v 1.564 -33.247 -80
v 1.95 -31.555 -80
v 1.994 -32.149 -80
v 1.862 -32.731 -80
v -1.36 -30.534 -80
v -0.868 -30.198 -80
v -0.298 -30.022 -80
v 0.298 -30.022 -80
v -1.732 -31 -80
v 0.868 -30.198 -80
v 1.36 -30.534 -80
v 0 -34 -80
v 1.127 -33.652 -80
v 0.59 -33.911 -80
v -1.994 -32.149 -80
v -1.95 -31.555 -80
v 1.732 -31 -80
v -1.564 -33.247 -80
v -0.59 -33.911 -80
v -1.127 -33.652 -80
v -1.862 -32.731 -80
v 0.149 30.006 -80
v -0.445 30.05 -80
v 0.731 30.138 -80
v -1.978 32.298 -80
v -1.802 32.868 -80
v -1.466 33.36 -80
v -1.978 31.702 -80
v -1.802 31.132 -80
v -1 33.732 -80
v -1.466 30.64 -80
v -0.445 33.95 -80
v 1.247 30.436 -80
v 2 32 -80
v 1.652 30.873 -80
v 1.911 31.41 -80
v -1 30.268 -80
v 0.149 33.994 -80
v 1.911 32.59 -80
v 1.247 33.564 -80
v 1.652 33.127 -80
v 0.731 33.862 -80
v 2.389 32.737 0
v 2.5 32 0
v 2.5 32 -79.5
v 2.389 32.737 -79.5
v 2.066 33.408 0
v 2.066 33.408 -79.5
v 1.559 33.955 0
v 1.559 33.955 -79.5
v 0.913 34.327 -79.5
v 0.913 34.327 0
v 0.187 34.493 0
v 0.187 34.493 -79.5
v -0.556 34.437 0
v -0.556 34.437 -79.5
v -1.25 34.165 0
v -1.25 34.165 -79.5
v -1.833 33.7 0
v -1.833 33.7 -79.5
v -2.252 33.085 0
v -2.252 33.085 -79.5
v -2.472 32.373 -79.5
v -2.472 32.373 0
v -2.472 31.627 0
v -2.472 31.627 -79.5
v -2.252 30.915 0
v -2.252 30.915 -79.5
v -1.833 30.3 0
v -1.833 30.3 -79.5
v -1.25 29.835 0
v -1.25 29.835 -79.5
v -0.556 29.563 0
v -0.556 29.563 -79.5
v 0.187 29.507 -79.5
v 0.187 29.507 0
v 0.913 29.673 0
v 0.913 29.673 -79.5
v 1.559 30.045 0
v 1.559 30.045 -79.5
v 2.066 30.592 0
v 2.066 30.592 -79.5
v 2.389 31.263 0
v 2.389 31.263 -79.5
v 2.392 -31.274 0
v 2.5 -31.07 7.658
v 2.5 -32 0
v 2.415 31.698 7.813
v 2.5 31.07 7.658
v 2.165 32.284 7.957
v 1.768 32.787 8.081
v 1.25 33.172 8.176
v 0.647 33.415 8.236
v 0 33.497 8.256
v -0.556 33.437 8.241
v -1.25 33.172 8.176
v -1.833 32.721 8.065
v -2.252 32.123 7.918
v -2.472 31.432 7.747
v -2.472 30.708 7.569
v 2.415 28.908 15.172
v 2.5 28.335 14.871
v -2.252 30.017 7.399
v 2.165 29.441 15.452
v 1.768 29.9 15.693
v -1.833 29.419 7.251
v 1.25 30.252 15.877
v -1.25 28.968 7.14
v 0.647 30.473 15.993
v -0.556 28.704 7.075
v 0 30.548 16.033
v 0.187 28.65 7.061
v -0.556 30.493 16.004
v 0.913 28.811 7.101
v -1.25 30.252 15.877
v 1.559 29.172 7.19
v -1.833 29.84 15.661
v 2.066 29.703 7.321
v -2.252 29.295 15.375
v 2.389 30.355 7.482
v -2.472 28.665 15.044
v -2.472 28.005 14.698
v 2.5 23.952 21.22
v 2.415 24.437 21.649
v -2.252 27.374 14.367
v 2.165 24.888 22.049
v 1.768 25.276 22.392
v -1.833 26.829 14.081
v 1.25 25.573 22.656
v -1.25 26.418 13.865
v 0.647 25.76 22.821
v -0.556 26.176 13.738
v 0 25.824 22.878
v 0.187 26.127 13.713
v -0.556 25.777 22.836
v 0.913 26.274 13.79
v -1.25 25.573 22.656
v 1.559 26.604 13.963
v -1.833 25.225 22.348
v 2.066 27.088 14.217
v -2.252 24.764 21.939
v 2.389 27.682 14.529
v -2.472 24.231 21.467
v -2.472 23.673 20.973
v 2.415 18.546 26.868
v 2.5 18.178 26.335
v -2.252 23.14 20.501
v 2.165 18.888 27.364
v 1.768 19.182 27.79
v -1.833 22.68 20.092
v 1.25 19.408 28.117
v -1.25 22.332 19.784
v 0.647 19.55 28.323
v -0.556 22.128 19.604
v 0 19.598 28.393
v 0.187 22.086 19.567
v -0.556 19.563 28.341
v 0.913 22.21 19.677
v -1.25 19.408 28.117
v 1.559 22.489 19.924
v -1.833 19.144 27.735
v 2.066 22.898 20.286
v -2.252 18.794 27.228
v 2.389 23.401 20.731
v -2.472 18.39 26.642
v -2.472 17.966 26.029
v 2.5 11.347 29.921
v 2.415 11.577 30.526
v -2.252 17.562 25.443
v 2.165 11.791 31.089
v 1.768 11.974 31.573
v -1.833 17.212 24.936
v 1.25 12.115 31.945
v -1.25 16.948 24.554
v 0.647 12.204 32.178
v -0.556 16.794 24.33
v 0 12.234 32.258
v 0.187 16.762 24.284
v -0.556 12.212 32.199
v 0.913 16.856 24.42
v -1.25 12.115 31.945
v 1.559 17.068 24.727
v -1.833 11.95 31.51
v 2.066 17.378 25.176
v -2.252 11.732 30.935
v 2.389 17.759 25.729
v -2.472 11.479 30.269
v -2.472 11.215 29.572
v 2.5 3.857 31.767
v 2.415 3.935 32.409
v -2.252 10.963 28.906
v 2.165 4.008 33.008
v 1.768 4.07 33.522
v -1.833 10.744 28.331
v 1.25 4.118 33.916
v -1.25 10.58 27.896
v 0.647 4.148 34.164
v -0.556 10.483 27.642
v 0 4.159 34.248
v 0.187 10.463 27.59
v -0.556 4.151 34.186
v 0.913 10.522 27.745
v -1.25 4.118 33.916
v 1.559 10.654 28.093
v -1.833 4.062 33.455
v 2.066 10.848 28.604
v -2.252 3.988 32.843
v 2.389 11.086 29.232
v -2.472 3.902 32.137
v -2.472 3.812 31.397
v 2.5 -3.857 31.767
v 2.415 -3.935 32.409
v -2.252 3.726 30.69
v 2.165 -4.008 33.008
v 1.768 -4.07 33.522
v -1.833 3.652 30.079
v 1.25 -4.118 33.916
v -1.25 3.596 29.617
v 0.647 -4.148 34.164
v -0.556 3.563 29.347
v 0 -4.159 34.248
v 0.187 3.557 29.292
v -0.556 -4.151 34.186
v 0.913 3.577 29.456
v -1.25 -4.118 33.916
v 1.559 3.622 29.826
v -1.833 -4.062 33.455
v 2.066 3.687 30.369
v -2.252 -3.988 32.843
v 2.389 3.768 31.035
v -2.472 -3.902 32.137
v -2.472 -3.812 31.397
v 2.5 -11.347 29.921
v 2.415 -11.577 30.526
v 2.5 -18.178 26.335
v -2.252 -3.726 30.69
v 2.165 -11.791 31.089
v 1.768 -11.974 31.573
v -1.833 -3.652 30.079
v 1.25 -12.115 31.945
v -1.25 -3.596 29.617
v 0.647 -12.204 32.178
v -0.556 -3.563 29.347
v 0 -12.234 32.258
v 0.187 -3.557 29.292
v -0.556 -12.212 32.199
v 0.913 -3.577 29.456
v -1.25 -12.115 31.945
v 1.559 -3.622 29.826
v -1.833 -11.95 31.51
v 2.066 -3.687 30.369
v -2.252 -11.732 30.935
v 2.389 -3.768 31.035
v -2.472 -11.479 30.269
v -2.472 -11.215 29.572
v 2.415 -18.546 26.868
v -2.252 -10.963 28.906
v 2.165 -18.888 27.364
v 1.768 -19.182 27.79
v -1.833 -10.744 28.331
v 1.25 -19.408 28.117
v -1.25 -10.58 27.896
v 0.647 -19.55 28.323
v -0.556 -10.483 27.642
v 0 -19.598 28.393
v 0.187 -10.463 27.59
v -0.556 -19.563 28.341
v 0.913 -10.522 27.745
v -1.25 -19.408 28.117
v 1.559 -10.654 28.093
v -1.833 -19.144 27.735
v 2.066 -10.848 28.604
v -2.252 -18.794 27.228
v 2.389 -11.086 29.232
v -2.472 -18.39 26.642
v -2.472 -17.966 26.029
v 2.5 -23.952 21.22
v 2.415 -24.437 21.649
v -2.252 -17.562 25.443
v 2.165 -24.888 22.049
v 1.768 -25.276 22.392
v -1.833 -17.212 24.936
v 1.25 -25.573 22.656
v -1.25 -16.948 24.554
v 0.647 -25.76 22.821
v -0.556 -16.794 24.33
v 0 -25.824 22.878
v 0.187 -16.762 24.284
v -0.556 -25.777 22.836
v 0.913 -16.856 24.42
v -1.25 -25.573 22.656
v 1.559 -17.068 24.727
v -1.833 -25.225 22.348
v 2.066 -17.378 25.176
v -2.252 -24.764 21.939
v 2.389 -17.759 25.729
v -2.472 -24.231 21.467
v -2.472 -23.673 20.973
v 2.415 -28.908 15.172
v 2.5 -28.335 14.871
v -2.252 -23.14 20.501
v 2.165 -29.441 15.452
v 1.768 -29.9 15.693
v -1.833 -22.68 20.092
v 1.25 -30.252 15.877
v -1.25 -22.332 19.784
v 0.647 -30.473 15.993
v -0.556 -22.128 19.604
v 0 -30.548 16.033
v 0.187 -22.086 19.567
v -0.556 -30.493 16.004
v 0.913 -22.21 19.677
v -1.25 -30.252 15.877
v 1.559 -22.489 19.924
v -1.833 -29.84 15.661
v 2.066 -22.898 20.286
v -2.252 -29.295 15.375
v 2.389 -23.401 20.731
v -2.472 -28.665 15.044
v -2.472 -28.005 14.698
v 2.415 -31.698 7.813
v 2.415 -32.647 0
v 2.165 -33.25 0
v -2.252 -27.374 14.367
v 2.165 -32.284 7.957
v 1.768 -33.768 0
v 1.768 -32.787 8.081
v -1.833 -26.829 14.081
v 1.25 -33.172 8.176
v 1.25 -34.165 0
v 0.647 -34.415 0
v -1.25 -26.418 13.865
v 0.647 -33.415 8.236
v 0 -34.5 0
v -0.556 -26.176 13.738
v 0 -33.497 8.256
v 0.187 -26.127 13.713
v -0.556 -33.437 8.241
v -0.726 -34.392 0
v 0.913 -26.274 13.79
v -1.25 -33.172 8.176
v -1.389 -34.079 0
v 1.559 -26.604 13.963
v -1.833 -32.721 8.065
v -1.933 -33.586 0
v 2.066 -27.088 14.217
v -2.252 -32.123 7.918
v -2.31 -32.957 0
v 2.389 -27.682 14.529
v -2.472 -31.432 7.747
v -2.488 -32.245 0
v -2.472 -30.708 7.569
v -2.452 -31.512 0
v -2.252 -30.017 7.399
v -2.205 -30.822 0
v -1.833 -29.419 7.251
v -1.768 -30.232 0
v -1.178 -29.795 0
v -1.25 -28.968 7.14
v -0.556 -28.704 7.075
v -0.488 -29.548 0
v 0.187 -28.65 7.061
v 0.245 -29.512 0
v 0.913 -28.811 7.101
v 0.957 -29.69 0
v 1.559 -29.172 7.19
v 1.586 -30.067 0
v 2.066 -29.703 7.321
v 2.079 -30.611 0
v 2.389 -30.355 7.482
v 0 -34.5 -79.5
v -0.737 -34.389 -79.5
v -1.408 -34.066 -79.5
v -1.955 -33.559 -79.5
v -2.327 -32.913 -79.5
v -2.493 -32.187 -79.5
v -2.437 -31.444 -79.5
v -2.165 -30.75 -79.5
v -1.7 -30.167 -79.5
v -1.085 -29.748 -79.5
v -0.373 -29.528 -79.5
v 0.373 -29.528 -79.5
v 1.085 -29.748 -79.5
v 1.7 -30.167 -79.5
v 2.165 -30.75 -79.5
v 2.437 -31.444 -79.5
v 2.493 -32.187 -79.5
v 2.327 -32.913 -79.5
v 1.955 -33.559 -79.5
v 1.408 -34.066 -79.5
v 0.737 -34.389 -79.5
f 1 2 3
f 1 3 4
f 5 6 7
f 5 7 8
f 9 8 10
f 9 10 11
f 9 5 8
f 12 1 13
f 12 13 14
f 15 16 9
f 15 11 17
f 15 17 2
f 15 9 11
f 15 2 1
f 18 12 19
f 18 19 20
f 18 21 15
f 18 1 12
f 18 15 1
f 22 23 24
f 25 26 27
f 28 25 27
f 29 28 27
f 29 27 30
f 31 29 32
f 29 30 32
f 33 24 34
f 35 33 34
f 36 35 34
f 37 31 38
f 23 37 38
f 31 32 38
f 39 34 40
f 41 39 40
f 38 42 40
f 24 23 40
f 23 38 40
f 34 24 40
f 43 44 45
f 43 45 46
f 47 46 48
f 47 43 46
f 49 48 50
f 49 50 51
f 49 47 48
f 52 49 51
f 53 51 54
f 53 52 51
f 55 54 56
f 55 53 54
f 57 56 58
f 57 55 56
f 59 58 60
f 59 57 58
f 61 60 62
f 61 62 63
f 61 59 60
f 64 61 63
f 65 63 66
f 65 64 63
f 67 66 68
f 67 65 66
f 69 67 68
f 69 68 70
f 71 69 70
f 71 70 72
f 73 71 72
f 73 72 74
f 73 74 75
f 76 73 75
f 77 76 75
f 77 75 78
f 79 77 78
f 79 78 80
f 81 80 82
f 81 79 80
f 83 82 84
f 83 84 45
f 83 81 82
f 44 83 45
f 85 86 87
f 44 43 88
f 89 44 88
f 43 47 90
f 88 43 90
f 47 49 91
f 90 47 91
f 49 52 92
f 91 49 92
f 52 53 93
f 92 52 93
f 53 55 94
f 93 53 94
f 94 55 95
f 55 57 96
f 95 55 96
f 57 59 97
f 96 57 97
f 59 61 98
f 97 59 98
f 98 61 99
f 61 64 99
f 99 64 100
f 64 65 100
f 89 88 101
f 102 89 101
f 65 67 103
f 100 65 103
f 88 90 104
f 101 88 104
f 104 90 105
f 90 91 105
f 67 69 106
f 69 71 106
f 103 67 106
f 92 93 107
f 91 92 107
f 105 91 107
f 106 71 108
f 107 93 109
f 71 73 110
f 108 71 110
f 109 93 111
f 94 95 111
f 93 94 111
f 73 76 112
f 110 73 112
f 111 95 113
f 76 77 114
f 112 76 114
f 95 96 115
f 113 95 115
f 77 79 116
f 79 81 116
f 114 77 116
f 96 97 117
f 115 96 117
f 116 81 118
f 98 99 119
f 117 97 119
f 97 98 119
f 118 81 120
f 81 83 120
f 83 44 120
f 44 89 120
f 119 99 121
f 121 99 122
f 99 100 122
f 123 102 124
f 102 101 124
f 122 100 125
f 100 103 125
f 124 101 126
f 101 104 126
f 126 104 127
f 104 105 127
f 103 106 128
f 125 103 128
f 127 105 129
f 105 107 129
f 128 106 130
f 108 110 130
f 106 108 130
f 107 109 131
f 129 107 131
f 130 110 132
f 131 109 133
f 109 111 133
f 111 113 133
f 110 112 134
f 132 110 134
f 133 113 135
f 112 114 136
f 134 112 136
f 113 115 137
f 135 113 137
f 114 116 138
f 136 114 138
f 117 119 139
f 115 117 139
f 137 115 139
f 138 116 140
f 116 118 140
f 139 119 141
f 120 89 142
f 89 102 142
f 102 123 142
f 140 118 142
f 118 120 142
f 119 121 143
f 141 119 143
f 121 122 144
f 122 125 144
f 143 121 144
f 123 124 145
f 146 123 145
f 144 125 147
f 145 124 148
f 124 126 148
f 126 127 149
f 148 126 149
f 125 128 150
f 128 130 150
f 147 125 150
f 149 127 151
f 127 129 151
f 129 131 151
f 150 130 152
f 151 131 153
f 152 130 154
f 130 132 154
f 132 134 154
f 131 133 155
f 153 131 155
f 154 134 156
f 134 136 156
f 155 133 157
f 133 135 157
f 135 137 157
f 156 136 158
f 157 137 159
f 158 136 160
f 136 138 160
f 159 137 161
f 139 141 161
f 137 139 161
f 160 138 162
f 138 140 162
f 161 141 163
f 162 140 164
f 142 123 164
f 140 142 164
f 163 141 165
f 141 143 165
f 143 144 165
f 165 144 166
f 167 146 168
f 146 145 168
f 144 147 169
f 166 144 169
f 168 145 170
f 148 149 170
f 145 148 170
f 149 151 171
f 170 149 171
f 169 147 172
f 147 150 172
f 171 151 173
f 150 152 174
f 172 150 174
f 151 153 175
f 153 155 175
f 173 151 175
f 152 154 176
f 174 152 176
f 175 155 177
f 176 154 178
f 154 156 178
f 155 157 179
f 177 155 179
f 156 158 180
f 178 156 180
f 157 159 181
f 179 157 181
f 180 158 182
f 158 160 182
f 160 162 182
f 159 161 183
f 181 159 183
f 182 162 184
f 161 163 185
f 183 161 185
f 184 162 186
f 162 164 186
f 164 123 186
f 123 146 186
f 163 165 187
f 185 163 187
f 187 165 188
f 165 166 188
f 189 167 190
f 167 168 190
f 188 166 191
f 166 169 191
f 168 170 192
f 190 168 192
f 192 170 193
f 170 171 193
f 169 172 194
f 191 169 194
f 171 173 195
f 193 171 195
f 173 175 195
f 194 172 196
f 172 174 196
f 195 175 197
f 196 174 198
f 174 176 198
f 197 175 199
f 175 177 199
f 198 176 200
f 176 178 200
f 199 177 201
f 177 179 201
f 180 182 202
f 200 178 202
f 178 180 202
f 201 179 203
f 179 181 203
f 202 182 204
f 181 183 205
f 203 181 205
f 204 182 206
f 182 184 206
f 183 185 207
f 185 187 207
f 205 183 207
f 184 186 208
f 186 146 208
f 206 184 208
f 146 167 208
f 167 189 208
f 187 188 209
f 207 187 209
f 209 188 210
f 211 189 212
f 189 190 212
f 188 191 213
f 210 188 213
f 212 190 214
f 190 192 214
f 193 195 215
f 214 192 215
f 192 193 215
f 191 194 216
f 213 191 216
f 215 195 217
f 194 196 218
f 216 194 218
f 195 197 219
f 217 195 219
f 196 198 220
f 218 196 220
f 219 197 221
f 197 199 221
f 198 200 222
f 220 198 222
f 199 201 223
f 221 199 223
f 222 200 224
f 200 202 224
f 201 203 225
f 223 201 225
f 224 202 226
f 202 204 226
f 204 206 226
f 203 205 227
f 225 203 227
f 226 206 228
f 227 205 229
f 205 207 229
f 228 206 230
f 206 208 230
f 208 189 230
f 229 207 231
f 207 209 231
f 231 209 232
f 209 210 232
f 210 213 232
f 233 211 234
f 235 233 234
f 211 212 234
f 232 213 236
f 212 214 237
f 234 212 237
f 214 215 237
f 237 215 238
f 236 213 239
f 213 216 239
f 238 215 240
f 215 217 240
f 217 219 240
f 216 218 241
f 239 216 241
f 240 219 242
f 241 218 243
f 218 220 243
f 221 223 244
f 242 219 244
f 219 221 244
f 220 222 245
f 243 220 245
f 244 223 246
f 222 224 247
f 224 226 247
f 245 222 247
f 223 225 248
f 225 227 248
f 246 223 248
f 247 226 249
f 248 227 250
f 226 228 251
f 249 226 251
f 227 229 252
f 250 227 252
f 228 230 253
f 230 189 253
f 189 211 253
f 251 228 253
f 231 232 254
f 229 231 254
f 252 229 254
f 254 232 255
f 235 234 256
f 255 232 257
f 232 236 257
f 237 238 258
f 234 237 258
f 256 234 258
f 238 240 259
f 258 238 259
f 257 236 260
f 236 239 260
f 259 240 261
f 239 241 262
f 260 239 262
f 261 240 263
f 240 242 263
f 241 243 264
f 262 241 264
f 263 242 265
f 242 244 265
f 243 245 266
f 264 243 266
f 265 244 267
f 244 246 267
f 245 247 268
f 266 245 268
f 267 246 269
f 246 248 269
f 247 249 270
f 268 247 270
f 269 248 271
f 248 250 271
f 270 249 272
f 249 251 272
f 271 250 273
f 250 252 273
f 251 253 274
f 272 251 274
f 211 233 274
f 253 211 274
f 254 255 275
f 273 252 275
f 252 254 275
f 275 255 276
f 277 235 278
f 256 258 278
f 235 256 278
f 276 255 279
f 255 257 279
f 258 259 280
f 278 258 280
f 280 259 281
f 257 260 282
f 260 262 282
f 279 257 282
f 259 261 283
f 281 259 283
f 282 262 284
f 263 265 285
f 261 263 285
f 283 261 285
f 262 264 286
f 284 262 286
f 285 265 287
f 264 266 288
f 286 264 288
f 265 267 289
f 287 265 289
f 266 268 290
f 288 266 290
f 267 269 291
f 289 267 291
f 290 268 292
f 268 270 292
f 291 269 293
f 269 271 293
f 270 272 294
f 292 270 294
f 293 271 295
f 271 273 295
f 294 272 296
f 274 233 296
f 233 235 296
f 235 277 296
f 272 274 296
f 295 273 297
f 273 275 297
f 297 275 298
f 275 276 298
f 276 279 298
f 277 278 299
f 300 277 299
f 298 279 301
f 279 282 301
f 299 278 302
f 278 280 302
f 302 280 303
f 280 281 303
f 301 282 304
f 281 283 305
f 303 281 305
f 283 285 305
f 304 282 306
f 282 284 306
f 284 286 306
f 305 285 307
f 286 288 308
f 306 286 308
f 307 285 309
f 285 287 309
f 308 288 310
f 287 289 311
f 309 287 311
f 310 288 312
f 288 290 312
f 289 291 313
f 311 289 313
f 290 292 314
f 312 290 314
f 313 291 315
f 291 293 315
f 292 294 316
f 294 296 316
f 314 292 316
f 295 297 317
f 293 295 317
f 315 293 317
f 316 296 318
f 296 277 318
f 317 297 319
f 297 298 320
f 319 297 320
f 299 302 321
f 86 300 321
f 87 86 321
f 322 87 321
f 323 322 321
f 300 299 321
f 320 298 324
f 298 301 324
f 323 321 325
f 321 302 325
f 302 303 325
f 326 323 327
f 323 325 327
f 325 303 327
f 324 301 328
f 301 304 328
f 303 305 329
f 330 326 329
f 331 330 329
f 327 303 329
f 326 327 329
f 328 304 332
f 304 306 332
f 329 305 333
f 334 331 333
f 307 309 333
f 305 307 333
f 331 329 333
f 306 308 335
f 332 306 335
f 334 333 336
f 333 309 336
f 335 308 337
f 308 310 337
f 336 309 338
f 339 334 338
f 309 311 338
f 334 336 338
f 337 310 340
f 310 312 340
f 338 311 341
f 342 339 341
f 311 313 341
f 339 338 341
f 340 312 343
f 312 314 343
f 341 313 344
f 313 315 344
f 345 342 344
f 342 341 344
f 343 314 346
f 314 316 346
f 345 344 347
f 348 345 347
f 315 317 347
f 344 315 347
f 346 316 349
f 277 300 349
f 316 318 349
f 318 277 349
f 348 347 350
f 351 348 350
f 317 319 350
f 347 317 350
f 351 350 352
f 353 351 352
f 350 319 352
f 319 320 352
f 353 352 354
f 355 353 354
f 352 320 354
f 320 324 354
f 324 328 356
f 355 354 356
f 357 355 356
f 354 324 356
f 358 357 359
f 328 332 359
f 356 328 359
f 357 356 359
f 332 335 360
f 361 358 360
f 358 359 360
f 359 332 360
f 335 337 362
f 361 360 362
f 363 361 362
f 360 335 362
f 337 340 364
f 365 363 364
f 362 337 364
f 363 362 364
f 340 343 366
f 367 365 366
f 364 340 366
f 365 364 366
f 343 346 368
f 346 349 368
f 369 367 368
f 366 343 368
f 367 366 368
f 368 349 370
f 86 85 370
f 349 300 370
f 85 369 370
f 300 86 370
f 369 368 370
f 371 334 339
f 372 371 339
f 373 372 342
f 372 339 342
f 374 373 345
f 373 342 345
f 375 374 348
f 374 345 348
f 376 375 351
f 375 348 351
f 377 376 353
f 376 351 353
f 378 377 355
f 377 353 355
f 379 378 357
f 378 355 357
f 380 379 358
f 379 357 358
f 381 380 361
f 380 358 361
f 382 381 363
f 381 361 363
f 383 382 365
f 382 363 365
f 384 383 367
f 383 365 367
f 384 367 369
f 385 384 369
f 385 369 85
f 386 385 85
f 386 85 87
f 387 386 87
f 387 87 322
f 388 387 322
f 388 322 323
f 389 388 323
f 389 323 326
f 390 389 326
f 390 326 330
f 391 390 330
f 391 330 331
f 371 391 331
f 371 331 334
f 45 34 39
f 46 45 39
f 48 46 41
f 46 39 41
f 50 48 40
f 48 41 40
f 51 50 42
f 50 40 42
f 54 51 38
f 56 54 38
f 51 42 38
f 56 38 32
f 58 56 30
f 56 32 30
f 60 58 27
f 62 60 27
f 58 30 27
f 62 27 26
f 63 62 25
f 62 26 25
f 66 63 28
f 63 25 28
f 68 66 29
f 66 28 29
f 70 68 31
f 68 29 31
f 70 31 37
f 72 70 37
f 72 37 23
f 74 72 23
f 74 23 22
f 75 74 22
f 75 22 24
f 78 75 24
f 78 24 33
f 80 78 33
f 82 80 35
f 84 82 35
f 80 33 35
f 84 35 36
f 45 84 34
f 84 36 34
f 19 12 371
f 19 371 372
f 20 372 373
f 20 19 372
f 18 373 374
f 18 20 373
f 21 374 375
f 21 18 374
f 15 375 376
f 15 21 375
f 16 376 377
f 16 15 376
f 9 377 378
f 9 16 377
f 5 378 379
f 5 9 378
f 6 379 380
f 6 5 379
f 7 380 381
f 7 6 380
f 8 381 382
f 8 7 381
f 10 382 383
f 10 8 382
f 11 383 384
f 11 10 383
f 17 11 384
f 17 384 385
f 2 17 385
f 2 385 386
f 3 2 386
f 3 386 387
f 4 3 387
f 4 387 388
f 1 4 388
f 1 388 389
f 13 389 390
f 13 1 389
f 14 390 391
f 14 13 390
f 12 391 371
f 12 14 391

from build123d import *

# Parameters (mm, degrees)
SKETCH1_R           = 2.5
REVOLVE1_ANGLE      = 180
SKETCH1_2_R         = 2.5
BOSS_EXTRUDE1_DEPTH = 80
SKETCH2_R           = 2.5
BOSS_EXTRUDE2_DEPTH = 80
CHAMFER1_SIZE       = 0.5


with BuildPart() as part:
    # Sketch1 → Revolve1 (revolve)
    with BuildSketch(Plane.XY):
        with Locations((0, 32)):
            Circle(SKETCH1_R)
    revolve(axis=Axis((0, 0, 0), (1, 0, 0)), revolution_arc=REVOLVE1_ANGLE)

    # Sketch1<2> → Boss-Extrude1 (add)
    with BuildSketch(Plane.XY):
        with Locations((0, 32)):
            Circle(SKETCH1_2_R)
    extrude(amount=-BOSS_EXTRUDE1_DEPTH)

    # Sketch2 → Boss-Extrude2 (add)
    with BuildSketch(Plane(origin=(0, 0, 0), x_dir=(-1, 0, 0), z_dir=(0, 0, -1))):
        with Locations((0, -32)):
            Circle(SKETCH2_R)
    extrude(amount=BOSS_EXTRUDE2_DEPTH)

    # Chamfer1
    chamfer1_edges = [part.edges().sort_by_distance(p)[0] for p in [
        (2.5, -32, -80),
        (-2.5, 32, -80),
    ]]
    chamfer(chamfer1_edges, length=CHAMFER1_SIZE)


solid = part.part
